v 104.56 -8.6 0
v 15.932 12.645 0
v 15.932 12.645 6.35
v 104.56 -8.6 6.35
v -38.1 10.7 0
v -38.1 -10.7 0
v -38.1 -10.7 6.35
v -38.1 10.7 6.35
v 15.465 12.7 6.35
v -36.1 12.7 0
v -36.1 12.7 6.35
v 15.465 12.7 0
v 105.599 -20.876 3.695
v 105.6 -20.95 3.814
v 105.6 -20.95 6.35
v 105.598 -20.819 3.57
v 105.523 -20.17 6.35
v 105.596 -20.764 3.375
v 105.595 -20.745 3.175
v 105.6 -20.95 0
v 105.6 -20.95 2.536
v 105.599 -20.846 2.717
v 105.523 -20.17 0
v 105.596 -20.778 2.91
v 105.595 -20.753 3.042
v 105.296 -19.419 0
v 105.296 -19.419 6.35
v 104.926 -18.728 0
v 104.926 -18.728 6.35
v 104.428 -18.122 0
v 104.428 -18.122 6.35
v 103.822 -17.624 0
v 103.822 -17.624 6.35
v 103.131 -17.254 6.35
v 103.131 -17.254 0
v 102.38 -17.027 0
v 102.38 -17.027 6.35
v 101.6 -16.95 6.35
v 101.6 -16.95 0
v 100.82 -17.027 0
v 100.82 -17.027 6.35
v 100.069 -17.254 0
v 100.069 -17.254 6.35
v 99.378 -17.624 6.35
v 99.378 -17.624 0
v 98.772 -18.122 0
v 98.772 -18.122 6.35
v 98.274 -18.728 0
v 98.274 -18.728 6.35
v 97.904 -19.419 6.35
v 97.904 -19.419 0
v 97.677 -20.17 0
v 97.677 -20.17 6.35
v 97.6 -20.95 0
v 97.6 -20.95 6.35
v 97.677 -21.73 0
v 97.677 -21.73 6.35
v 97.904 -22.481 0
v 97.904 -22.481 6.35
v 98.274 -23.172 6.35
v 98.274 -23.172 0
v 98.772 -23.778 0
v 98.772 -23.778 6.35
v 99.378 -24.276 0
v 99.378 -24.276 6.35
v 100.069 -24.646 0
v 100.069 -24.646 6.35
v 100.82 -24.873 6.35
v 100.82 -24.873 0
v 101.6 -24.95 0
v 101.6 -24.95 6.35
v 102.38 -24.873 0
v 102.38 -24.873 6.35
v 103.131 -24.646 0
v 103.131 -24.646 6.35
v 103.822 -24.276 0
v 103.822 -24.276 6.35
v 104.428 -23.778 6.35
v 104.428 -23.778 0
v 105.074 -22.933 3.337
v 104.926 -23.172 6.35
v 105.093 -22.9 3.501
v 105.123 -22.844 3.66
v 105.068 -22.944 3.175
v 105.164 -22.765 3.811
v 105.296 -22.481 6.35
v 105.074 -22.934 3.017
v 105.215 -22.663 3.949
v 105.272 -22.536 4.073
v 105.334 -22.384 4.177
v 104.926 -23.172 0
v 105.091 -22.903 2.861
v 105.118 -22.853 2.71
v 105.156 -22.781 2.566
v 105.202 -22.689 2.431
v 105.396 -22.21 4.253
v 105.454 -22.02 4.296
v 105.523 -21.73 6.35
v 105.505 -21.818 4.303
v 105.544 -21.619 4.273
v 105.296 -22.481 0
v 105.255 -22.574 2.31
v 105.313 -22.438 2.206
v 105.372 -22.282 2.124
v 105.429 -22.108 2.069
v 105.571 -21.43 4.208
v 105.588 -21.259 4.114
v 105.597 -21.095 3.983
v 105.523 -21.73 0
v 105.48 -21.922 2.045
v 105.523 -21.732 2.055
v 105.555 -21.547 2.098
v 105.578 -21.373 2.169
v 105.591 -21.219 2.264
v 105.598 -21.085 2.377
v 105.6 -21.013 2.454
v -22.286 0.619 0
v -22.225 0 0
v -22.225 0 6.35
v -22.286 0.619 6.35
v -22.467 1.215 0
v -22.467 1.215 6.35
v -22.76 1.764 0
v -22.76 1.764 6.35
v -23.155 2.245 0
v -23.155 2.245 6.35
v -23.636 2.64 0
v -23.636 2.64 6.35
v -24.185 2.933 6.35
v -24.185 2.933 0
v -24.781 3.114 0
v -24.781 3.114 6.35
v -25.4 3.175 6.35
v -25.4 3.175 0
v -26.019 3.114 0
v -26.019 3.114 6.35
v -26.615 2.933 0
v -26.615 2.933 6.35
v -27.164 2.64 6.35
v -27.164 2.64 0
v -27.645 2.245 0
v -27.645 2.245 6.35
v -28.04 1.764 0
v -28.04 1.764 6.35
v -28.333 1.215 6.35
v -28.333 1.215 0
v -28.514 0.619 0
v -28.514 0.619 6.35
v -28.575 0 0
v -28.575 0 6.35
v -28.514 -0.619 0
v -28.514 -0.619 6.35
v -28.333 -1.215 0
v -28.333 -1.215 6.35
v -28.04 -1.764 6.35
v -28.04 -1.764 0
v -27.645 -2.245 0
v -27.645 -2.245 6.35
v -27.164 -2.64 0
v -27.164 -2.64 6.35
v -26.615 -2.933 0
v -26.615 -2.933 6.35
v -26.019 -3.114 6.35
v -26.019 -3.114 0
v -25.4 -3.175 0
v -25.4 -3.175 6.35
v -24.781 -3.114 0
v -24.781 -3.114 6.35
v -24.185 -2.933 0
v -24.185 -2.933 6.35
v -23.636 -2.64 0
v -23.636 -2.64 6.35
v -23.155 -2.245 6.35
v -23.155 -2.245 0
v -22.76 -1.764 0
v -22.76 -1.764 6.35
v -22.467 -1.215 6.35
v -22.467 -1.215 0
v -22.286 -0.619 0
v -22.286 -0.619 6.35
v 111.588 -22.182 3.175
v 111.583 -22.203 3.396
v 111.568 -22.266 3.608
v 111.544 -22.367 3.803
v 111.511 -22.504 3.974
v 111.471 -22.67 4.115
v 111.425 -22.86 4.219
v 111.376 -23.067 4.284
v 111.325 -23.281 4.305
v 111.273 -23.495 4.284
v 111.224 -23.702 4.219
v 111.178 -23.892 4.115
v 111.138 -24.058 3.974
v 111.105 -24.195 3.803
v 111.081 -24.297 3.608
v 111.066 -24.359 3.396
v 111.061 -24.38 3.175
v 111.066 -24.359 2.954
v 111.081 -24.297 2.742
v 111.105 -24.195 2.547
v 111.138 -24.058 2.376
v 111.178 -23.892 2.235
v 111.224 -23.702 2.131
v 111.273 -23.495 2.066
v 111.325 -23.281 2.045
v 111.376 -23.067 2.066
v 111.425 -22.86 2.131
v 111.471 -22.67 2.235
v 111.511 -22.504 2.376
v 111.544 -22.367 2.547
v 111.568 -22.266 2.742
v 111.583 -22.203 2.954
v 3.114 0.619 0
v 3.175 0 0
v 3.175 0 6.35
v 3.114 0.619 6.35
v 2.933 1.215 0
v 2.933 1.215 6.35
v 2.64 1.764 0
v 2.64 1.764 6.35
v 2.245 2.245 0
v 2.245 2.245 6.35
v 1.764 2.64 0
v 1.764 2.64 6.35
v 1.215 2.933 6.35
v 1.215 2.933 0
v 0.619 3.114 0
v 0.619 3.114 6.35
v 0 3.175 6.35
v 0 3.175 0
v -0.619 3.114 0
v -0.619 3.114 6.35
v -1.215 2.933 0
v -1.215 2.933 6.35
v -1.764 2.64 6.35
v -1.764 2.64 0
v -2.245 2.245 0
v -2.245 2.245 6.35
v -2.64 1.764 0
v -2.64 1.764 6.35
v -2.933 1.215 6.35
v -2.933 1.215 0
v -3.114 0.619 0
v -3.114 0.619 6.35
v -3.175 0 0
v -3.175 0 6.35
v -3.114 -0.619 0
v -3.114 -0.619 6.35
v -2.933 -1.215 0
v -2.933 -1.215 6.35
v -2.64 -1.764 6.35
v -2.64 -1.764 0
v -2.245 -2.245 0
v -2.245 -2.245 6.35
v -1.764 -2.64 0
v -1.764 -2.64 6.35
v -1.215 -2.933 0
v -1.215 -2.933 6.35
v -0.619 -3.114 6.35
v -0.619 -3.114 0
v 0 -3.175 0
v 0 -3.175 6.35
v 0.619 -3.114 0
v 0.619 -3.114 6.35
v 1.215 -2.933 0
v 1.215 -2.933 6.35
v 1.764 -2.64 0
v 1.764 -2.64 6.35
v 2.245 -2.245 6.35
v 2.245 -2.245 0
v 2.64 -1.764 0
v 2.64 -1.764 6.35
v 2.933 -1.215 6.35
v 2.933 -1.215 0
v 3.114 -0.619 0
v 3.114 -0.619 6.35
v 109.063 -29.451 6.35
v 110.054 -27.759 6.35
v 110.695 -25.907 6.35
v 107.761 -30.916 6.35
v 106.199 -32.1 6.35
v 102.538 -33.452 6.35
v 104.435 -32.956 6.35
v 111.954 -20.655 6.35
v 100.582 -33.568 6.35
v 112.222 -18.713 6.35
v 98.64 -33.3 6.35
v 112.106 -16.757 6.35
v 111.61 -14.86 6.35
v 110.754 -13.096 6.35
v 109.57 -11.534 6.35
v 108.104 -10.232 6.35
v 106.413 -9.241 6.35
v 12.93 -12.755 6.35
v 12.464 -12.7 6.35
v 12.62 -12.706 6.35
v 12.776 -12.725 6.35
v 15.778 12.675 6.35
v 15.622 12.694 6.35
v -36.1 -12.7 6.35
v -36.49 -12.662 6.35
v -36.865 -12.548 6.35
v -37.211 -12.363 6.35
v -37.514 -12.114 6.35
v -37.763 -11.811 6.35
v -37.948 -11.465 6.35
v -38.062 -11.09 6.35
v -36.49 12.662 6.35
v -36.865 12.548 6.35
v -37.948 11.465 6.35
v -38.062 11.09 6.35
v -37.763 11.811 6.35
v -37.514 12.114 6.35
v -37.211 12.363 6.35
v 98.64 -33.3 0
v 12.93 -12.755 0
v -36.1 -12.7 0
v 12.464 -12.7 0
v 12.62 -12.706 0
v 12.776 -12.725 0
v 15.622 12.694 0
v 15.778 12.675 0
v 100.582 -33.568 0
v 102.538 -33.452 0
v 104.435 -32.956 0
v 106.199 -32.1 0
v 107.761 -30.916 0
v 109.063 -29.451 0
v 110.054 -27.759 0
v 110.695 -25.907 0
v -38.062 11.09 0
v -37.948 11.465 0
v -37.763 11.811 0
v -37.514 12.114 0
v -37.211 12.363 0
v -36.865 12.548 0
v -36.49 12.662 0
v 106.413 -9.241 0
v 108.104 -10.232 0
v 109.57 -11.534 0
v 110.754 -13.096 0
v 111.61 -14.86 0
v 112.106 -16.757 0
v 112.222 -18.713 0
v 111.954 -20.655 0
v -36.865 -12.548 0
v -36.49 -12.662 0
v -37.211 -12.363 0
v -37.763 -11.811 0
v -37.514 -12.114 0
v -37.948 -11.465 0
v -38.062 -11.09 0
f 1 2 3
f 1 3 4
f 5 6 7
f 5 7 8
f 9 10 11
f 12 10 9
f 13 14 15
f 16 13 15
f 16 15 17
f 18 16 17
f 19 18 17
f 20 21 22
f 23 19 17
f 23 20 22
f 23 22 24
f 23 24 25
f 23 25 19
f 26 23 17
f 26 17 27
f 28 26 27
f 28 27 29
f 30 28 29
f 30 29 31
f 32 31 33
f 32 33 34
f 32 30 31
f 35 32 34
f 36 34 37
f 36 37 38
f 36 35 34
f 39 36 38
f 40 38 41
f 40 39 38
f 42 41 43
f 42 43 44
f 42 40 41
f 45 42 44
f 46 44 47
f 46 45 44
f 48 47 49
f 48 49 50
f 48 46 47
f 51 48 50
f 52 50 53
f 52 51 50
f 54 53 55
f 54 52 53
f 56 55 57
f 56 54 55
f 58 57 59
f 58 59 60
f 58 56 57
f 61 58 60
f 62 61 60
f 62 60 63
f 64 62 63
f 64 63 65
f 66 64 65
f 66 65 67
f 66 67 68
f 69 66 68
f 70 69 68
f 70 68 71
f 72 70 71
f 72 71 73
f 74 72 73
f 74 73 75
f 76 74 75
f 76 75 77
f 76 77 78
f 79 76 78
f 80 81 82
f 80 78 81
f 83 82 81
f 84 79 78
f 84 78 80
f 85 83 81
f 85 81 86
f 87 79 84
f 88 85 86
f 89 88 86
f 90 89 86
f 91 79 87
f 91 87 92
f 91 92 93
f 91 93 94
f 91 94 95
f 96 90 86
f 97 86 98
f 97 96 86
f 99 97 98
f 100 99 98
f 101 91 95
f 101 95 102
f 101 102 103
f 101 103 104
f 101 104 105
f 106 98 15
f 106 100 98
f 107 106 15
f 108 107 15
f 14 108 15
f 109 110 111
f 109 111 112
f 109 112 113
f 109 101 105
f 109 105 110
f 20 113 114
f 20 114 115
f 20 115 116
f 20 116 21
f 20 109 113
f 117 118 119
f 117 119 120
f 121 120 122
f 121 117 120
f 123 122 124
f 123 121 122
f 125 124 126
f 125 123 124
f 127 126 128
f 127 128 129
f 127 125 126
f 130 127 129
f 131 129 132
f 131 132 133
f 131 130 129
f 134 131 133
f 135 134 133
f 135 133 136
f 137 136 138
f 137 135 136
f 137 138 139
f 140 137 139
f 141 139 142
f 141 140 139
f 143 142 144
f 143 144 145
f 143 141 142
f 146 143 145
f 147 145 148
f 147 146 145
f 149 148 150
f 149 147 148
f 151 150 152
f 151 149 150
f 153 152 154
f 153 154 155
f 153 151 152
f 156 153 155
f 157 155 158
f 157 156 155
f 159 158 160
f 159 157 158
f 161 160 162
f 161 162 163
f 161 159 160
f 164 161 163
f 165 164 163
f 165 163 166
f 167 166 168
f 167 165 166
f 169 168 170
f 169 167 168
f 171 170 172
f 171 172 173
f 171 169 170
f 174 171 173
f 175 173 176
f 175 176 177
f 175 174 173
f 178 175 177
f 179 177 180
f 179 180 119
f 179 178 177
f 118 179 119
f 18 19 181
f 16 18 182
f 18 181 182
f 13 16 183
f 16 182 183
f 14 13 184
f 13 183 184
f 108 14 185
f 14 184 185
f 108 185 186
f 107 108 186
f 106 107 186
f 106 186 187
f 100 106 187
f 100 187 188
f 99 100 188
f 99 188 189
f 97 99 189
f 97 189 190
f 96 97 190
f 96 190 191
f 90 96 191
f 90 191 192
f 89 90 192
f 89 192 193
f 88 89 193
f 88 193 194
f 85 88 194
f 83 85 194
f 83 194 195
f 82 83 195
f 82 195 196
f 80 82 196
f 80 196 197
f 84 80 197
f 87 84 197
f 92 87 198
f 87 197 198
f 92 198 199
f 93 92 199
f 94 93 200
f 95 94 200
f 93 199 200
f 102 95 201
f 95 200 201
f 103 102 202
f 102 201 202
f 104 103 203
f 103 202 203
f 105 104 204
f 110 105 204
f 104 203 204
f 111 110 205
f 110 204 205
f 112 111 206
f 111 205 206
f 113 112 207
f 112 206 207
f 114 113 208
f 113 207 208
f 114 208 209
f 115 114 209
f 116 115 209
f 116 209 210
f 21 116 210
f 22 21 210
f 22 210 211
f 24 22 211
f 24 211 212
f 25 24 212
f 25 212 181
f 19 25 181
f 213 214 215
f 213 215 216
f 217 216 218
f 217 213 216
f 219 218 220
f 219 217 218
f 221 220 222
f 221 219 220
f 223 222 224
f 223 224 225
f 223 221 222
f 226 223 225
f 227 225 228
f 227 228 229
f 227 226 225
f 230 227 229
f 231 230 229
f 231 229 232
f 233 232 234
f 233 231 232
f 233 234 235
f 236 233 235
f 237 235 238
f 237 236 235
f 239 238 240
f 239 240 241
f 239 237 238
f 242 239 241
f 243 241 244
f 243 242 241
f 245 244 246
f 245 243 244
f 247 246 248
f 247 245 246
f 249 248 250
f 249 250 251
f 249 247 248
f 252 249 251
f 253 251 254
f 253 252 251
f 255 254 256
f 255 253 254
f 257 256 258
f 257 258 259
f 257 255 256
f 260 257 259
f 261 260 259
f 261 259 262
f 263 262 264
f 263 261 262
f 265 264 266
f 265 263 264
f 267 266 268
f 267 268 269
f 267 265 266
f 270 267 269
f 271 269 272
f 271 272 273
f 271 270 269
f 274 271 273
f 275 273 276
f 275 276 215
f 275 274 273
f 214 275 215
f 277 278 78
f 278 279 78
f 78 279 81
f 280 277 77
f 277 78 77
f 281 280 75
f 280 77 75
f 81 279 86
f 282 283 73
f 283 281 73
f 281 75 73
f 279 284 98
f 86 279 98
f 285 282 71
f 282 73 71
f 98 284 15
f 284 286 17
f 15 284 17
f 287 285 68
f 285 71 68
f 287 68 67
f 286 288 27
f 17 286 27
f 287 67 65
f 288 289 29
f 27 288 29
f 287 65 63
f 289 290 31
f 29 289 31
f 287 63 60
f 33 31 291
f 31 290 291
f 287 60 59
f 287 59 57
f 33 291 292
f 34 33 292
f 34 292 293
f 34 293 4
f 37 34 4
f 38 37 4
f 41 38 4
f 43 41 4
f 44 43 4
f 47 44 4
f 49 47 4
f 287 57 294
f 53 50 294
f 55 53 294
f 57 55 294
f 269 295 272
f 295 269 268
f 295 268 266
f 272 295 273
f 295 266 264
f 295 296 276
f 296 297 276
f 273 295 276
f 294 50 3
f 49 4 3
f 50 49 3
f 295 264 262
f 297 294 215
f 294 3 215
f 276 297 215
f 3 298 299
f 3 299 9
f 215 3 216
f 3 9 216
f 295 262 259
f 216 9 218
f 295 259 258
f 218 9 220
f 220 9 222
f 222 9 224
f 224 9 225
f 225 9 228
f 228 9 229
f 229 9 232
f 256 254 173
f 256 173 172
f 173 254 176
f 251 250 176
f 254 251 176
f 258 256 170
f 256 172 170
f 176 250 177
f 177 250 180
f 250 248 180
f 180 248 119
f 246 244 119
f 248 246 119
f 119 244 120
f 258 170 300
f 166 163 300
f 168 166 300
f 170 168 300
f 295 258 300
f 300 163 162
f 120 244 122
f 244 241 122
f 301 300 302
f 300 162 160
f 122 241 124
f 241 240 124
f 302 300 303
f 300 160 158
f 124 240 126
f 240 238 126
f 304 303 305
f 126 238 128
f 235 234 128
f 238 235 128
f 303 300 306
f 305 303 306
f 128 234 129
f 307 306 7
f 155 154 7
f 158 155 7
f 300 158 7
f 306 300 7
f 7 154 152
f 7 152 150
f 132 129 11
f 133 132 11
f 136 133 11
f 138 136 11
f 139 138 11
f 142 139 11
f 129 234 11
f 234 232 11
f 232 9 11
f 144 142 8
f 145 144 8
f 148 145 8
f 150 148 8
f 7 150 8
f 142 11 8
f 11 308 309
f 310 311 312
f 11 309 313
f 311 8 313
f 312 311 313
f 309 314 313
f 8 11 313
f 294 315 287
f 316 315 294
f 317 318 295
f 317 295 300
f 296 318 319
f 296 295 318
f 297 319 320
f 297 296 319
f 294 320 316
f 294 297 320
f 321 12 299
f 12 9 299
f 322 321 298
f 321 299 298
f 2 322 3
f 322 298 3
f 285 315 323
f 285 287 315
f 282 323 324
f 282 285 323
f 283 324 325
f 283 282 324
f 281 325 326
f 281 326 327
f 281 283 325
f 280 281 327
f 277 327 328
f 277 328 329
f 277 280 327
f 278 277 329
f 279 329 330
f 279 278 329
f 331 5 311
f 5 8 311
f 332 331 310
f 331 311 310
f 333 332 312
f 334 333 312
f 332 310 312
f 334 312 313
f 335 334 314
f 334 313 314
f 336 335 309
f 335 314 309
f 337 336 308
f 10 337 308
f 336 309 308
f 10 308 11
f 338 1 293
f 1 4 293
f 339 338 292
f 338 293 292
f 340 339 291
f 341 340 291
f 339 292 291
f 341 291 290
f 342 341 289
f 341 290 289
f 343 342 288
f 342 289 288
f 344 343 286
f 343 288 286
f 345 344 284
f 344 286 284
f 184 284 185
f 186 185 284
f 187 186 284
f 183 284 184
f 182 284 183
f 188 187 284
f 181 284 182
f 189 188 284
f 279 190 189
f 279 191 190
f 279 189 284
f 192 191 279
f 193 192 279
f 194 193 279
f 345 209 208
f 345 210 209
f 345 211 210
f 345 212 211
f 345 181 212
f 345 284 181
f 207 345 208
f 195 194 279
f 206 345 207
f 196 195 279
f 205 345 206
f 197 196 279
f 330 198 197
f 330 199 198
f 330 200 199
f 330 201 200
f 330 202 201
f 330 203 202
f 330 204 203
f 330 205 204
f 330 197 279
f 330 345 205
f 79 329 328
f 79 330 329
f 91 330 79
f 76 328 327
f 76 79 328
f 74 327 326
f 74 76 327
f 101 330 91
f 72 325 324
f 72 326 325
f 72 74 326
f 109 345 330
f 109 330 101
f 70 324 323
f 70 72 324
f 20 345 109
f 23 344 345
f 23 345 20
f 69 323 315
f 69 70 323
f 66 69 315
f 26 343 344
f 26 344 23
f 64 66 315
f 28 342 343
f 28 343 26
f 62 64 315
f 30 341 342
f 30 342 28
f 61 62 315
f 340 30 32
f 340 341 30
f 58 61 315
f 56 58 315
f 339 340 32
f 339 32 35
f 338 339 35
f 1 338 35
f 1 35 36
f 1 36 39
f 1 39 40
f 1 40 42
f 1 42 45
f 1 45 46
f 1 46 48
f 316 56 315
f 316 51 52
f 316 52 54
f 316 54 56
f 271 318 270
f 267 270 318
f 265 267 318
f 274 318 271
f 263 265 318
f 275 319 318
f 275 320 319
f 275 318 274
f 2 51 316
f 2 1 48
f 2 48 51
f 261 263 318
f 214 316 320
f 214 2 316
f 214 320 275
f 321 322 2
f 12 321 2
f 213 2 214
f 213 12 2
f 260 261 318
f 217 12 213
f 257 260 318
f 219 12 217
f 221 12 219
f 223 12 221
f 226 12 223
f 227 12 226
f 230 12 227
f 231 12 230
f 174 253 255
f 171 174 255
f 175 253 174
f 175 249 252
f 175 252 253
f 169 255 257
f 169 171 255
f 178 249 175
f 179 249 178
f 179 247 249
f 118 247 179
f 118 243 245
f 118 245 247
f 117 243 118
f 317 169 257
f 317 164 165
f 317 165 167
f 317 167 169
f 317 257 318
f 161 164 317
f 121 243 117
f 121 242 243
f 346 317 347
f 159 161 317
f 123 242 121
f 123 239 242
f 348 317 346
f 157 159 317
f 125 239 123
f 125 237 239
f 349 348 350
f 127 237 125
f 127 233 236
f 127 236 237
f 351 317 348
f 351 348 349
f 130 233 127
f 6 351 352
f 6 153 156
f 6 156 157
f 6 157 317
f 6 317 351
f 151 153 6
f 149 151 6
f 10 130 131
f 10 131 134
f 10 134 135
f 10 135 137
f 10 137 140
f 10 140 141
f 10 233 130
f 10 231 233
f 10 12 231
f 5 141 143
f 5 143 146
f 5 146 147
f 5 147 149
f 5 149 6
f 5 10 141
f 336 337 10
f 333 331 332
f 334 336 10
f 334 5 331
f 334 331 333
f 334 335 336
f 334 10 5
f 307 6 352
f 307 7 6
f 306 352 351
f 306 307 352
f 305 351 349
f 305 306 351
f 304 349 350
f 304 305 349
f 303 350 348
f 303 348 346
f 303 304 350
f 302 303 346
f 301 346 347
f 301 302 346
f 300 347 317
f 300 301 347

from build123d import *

# Parameters (mm, degrees)
SKETCH1_R               = 3.175
SKETCH1_R_2             = 4
BOSS_EXTRUDE1_DEPTH     = 6.35
CUT_EXTRUDE2_REACH      = 155.866
CUT_EXTRUDE2_END_RADIUS = 4
SKETCH3_R               = 1.1303
FILLET3_R               = 2
FILLET4_R               = 10


with BuildPart() as part:
    # Sketch1 → Boss-Extrude1 (new body)
    with BuildSketch(Plane.XY):
        Polygon((-38.1, -12.7), (-38.1, 12.7), (15.701735639, 12.7), (114.28491418, -10.930870684), (108.364133554, -35.631161305), (12.7, -12.7), align=None)
        with Locations((-25.4, 0)):
            Circle(SKETCH1_R, mode=Mode.SUBTRACT)
        Circle(SKETCH1_R, mode=Mode.SUBTRACT)
        with Locations((101.6, -20.95)):
            Circle(SKETCH1_R_2, mode=Mode.SUBTRACT)
    extrude(amount=BOSS_EXTRUDE1_DEPTH)

    # Cut-Extrude2: up to this cylinder (the profile starts outside it)
    cut_extrude2_end = Plane(origin=(101.6, -20.95, 3.175), z_dir=(0, 0, -1)) * Cylinder(CUT_EXTRUDE2_END_RADIUS, 320.732, mode=Mode.PRIVATE)
    # Sketch3 → Cut-Extrude2 (cut, up to the surface)
    with BuildSketch(Plane(origin=(110.552900462, -26.500071647, 0), x_dir=(0, 0, -1), z_dir=(0.9724523866696595, -0.23310159943784806, 0)), mode=Mode.PRIVATE) as cut_extrude2_sk1:
        with Locations(Location((-3.175, 3.310245002, 0), (0, 0, 90))):
            Circle(SKETCH3_R)
    cut_extrude2_tool1 = extrude(cut_extrude2_sk1.sketch, amount=-CUT_EXTRUDE2_REACH, mode=Mode.PRIVATE) - cut_extrude2_end
    add(cut_extrude2_tool1.solids().sort_by_distance((111.324524, -23.281016, 3.175))[0], mode=Mode.SUBTRACT)

    # Fillet3
    fillet3_edges = [part.edges().sort_by_distance(p)[0] for p in [
        (12.7, -12.7, 3.175),
        (-38.1, -12.7, 3.175),
        (-38.1, 12.7, 3.175),
        (15.701735639, 12.7, 3.175),
    ]]
    fillet(fillet3_edges, radius=FILLET3_R)

    # Fillet4
    fillet4_edges = [part.edges().sort_by_distance(p)[0] for p in [
        (108.364133554, -35.631161305, 3.175),
        (114.28491418, -10.930870684, 3.175),
    ]]
    fillet(fillet4_edges, radius=FILLET4_R)


solid = part.part
